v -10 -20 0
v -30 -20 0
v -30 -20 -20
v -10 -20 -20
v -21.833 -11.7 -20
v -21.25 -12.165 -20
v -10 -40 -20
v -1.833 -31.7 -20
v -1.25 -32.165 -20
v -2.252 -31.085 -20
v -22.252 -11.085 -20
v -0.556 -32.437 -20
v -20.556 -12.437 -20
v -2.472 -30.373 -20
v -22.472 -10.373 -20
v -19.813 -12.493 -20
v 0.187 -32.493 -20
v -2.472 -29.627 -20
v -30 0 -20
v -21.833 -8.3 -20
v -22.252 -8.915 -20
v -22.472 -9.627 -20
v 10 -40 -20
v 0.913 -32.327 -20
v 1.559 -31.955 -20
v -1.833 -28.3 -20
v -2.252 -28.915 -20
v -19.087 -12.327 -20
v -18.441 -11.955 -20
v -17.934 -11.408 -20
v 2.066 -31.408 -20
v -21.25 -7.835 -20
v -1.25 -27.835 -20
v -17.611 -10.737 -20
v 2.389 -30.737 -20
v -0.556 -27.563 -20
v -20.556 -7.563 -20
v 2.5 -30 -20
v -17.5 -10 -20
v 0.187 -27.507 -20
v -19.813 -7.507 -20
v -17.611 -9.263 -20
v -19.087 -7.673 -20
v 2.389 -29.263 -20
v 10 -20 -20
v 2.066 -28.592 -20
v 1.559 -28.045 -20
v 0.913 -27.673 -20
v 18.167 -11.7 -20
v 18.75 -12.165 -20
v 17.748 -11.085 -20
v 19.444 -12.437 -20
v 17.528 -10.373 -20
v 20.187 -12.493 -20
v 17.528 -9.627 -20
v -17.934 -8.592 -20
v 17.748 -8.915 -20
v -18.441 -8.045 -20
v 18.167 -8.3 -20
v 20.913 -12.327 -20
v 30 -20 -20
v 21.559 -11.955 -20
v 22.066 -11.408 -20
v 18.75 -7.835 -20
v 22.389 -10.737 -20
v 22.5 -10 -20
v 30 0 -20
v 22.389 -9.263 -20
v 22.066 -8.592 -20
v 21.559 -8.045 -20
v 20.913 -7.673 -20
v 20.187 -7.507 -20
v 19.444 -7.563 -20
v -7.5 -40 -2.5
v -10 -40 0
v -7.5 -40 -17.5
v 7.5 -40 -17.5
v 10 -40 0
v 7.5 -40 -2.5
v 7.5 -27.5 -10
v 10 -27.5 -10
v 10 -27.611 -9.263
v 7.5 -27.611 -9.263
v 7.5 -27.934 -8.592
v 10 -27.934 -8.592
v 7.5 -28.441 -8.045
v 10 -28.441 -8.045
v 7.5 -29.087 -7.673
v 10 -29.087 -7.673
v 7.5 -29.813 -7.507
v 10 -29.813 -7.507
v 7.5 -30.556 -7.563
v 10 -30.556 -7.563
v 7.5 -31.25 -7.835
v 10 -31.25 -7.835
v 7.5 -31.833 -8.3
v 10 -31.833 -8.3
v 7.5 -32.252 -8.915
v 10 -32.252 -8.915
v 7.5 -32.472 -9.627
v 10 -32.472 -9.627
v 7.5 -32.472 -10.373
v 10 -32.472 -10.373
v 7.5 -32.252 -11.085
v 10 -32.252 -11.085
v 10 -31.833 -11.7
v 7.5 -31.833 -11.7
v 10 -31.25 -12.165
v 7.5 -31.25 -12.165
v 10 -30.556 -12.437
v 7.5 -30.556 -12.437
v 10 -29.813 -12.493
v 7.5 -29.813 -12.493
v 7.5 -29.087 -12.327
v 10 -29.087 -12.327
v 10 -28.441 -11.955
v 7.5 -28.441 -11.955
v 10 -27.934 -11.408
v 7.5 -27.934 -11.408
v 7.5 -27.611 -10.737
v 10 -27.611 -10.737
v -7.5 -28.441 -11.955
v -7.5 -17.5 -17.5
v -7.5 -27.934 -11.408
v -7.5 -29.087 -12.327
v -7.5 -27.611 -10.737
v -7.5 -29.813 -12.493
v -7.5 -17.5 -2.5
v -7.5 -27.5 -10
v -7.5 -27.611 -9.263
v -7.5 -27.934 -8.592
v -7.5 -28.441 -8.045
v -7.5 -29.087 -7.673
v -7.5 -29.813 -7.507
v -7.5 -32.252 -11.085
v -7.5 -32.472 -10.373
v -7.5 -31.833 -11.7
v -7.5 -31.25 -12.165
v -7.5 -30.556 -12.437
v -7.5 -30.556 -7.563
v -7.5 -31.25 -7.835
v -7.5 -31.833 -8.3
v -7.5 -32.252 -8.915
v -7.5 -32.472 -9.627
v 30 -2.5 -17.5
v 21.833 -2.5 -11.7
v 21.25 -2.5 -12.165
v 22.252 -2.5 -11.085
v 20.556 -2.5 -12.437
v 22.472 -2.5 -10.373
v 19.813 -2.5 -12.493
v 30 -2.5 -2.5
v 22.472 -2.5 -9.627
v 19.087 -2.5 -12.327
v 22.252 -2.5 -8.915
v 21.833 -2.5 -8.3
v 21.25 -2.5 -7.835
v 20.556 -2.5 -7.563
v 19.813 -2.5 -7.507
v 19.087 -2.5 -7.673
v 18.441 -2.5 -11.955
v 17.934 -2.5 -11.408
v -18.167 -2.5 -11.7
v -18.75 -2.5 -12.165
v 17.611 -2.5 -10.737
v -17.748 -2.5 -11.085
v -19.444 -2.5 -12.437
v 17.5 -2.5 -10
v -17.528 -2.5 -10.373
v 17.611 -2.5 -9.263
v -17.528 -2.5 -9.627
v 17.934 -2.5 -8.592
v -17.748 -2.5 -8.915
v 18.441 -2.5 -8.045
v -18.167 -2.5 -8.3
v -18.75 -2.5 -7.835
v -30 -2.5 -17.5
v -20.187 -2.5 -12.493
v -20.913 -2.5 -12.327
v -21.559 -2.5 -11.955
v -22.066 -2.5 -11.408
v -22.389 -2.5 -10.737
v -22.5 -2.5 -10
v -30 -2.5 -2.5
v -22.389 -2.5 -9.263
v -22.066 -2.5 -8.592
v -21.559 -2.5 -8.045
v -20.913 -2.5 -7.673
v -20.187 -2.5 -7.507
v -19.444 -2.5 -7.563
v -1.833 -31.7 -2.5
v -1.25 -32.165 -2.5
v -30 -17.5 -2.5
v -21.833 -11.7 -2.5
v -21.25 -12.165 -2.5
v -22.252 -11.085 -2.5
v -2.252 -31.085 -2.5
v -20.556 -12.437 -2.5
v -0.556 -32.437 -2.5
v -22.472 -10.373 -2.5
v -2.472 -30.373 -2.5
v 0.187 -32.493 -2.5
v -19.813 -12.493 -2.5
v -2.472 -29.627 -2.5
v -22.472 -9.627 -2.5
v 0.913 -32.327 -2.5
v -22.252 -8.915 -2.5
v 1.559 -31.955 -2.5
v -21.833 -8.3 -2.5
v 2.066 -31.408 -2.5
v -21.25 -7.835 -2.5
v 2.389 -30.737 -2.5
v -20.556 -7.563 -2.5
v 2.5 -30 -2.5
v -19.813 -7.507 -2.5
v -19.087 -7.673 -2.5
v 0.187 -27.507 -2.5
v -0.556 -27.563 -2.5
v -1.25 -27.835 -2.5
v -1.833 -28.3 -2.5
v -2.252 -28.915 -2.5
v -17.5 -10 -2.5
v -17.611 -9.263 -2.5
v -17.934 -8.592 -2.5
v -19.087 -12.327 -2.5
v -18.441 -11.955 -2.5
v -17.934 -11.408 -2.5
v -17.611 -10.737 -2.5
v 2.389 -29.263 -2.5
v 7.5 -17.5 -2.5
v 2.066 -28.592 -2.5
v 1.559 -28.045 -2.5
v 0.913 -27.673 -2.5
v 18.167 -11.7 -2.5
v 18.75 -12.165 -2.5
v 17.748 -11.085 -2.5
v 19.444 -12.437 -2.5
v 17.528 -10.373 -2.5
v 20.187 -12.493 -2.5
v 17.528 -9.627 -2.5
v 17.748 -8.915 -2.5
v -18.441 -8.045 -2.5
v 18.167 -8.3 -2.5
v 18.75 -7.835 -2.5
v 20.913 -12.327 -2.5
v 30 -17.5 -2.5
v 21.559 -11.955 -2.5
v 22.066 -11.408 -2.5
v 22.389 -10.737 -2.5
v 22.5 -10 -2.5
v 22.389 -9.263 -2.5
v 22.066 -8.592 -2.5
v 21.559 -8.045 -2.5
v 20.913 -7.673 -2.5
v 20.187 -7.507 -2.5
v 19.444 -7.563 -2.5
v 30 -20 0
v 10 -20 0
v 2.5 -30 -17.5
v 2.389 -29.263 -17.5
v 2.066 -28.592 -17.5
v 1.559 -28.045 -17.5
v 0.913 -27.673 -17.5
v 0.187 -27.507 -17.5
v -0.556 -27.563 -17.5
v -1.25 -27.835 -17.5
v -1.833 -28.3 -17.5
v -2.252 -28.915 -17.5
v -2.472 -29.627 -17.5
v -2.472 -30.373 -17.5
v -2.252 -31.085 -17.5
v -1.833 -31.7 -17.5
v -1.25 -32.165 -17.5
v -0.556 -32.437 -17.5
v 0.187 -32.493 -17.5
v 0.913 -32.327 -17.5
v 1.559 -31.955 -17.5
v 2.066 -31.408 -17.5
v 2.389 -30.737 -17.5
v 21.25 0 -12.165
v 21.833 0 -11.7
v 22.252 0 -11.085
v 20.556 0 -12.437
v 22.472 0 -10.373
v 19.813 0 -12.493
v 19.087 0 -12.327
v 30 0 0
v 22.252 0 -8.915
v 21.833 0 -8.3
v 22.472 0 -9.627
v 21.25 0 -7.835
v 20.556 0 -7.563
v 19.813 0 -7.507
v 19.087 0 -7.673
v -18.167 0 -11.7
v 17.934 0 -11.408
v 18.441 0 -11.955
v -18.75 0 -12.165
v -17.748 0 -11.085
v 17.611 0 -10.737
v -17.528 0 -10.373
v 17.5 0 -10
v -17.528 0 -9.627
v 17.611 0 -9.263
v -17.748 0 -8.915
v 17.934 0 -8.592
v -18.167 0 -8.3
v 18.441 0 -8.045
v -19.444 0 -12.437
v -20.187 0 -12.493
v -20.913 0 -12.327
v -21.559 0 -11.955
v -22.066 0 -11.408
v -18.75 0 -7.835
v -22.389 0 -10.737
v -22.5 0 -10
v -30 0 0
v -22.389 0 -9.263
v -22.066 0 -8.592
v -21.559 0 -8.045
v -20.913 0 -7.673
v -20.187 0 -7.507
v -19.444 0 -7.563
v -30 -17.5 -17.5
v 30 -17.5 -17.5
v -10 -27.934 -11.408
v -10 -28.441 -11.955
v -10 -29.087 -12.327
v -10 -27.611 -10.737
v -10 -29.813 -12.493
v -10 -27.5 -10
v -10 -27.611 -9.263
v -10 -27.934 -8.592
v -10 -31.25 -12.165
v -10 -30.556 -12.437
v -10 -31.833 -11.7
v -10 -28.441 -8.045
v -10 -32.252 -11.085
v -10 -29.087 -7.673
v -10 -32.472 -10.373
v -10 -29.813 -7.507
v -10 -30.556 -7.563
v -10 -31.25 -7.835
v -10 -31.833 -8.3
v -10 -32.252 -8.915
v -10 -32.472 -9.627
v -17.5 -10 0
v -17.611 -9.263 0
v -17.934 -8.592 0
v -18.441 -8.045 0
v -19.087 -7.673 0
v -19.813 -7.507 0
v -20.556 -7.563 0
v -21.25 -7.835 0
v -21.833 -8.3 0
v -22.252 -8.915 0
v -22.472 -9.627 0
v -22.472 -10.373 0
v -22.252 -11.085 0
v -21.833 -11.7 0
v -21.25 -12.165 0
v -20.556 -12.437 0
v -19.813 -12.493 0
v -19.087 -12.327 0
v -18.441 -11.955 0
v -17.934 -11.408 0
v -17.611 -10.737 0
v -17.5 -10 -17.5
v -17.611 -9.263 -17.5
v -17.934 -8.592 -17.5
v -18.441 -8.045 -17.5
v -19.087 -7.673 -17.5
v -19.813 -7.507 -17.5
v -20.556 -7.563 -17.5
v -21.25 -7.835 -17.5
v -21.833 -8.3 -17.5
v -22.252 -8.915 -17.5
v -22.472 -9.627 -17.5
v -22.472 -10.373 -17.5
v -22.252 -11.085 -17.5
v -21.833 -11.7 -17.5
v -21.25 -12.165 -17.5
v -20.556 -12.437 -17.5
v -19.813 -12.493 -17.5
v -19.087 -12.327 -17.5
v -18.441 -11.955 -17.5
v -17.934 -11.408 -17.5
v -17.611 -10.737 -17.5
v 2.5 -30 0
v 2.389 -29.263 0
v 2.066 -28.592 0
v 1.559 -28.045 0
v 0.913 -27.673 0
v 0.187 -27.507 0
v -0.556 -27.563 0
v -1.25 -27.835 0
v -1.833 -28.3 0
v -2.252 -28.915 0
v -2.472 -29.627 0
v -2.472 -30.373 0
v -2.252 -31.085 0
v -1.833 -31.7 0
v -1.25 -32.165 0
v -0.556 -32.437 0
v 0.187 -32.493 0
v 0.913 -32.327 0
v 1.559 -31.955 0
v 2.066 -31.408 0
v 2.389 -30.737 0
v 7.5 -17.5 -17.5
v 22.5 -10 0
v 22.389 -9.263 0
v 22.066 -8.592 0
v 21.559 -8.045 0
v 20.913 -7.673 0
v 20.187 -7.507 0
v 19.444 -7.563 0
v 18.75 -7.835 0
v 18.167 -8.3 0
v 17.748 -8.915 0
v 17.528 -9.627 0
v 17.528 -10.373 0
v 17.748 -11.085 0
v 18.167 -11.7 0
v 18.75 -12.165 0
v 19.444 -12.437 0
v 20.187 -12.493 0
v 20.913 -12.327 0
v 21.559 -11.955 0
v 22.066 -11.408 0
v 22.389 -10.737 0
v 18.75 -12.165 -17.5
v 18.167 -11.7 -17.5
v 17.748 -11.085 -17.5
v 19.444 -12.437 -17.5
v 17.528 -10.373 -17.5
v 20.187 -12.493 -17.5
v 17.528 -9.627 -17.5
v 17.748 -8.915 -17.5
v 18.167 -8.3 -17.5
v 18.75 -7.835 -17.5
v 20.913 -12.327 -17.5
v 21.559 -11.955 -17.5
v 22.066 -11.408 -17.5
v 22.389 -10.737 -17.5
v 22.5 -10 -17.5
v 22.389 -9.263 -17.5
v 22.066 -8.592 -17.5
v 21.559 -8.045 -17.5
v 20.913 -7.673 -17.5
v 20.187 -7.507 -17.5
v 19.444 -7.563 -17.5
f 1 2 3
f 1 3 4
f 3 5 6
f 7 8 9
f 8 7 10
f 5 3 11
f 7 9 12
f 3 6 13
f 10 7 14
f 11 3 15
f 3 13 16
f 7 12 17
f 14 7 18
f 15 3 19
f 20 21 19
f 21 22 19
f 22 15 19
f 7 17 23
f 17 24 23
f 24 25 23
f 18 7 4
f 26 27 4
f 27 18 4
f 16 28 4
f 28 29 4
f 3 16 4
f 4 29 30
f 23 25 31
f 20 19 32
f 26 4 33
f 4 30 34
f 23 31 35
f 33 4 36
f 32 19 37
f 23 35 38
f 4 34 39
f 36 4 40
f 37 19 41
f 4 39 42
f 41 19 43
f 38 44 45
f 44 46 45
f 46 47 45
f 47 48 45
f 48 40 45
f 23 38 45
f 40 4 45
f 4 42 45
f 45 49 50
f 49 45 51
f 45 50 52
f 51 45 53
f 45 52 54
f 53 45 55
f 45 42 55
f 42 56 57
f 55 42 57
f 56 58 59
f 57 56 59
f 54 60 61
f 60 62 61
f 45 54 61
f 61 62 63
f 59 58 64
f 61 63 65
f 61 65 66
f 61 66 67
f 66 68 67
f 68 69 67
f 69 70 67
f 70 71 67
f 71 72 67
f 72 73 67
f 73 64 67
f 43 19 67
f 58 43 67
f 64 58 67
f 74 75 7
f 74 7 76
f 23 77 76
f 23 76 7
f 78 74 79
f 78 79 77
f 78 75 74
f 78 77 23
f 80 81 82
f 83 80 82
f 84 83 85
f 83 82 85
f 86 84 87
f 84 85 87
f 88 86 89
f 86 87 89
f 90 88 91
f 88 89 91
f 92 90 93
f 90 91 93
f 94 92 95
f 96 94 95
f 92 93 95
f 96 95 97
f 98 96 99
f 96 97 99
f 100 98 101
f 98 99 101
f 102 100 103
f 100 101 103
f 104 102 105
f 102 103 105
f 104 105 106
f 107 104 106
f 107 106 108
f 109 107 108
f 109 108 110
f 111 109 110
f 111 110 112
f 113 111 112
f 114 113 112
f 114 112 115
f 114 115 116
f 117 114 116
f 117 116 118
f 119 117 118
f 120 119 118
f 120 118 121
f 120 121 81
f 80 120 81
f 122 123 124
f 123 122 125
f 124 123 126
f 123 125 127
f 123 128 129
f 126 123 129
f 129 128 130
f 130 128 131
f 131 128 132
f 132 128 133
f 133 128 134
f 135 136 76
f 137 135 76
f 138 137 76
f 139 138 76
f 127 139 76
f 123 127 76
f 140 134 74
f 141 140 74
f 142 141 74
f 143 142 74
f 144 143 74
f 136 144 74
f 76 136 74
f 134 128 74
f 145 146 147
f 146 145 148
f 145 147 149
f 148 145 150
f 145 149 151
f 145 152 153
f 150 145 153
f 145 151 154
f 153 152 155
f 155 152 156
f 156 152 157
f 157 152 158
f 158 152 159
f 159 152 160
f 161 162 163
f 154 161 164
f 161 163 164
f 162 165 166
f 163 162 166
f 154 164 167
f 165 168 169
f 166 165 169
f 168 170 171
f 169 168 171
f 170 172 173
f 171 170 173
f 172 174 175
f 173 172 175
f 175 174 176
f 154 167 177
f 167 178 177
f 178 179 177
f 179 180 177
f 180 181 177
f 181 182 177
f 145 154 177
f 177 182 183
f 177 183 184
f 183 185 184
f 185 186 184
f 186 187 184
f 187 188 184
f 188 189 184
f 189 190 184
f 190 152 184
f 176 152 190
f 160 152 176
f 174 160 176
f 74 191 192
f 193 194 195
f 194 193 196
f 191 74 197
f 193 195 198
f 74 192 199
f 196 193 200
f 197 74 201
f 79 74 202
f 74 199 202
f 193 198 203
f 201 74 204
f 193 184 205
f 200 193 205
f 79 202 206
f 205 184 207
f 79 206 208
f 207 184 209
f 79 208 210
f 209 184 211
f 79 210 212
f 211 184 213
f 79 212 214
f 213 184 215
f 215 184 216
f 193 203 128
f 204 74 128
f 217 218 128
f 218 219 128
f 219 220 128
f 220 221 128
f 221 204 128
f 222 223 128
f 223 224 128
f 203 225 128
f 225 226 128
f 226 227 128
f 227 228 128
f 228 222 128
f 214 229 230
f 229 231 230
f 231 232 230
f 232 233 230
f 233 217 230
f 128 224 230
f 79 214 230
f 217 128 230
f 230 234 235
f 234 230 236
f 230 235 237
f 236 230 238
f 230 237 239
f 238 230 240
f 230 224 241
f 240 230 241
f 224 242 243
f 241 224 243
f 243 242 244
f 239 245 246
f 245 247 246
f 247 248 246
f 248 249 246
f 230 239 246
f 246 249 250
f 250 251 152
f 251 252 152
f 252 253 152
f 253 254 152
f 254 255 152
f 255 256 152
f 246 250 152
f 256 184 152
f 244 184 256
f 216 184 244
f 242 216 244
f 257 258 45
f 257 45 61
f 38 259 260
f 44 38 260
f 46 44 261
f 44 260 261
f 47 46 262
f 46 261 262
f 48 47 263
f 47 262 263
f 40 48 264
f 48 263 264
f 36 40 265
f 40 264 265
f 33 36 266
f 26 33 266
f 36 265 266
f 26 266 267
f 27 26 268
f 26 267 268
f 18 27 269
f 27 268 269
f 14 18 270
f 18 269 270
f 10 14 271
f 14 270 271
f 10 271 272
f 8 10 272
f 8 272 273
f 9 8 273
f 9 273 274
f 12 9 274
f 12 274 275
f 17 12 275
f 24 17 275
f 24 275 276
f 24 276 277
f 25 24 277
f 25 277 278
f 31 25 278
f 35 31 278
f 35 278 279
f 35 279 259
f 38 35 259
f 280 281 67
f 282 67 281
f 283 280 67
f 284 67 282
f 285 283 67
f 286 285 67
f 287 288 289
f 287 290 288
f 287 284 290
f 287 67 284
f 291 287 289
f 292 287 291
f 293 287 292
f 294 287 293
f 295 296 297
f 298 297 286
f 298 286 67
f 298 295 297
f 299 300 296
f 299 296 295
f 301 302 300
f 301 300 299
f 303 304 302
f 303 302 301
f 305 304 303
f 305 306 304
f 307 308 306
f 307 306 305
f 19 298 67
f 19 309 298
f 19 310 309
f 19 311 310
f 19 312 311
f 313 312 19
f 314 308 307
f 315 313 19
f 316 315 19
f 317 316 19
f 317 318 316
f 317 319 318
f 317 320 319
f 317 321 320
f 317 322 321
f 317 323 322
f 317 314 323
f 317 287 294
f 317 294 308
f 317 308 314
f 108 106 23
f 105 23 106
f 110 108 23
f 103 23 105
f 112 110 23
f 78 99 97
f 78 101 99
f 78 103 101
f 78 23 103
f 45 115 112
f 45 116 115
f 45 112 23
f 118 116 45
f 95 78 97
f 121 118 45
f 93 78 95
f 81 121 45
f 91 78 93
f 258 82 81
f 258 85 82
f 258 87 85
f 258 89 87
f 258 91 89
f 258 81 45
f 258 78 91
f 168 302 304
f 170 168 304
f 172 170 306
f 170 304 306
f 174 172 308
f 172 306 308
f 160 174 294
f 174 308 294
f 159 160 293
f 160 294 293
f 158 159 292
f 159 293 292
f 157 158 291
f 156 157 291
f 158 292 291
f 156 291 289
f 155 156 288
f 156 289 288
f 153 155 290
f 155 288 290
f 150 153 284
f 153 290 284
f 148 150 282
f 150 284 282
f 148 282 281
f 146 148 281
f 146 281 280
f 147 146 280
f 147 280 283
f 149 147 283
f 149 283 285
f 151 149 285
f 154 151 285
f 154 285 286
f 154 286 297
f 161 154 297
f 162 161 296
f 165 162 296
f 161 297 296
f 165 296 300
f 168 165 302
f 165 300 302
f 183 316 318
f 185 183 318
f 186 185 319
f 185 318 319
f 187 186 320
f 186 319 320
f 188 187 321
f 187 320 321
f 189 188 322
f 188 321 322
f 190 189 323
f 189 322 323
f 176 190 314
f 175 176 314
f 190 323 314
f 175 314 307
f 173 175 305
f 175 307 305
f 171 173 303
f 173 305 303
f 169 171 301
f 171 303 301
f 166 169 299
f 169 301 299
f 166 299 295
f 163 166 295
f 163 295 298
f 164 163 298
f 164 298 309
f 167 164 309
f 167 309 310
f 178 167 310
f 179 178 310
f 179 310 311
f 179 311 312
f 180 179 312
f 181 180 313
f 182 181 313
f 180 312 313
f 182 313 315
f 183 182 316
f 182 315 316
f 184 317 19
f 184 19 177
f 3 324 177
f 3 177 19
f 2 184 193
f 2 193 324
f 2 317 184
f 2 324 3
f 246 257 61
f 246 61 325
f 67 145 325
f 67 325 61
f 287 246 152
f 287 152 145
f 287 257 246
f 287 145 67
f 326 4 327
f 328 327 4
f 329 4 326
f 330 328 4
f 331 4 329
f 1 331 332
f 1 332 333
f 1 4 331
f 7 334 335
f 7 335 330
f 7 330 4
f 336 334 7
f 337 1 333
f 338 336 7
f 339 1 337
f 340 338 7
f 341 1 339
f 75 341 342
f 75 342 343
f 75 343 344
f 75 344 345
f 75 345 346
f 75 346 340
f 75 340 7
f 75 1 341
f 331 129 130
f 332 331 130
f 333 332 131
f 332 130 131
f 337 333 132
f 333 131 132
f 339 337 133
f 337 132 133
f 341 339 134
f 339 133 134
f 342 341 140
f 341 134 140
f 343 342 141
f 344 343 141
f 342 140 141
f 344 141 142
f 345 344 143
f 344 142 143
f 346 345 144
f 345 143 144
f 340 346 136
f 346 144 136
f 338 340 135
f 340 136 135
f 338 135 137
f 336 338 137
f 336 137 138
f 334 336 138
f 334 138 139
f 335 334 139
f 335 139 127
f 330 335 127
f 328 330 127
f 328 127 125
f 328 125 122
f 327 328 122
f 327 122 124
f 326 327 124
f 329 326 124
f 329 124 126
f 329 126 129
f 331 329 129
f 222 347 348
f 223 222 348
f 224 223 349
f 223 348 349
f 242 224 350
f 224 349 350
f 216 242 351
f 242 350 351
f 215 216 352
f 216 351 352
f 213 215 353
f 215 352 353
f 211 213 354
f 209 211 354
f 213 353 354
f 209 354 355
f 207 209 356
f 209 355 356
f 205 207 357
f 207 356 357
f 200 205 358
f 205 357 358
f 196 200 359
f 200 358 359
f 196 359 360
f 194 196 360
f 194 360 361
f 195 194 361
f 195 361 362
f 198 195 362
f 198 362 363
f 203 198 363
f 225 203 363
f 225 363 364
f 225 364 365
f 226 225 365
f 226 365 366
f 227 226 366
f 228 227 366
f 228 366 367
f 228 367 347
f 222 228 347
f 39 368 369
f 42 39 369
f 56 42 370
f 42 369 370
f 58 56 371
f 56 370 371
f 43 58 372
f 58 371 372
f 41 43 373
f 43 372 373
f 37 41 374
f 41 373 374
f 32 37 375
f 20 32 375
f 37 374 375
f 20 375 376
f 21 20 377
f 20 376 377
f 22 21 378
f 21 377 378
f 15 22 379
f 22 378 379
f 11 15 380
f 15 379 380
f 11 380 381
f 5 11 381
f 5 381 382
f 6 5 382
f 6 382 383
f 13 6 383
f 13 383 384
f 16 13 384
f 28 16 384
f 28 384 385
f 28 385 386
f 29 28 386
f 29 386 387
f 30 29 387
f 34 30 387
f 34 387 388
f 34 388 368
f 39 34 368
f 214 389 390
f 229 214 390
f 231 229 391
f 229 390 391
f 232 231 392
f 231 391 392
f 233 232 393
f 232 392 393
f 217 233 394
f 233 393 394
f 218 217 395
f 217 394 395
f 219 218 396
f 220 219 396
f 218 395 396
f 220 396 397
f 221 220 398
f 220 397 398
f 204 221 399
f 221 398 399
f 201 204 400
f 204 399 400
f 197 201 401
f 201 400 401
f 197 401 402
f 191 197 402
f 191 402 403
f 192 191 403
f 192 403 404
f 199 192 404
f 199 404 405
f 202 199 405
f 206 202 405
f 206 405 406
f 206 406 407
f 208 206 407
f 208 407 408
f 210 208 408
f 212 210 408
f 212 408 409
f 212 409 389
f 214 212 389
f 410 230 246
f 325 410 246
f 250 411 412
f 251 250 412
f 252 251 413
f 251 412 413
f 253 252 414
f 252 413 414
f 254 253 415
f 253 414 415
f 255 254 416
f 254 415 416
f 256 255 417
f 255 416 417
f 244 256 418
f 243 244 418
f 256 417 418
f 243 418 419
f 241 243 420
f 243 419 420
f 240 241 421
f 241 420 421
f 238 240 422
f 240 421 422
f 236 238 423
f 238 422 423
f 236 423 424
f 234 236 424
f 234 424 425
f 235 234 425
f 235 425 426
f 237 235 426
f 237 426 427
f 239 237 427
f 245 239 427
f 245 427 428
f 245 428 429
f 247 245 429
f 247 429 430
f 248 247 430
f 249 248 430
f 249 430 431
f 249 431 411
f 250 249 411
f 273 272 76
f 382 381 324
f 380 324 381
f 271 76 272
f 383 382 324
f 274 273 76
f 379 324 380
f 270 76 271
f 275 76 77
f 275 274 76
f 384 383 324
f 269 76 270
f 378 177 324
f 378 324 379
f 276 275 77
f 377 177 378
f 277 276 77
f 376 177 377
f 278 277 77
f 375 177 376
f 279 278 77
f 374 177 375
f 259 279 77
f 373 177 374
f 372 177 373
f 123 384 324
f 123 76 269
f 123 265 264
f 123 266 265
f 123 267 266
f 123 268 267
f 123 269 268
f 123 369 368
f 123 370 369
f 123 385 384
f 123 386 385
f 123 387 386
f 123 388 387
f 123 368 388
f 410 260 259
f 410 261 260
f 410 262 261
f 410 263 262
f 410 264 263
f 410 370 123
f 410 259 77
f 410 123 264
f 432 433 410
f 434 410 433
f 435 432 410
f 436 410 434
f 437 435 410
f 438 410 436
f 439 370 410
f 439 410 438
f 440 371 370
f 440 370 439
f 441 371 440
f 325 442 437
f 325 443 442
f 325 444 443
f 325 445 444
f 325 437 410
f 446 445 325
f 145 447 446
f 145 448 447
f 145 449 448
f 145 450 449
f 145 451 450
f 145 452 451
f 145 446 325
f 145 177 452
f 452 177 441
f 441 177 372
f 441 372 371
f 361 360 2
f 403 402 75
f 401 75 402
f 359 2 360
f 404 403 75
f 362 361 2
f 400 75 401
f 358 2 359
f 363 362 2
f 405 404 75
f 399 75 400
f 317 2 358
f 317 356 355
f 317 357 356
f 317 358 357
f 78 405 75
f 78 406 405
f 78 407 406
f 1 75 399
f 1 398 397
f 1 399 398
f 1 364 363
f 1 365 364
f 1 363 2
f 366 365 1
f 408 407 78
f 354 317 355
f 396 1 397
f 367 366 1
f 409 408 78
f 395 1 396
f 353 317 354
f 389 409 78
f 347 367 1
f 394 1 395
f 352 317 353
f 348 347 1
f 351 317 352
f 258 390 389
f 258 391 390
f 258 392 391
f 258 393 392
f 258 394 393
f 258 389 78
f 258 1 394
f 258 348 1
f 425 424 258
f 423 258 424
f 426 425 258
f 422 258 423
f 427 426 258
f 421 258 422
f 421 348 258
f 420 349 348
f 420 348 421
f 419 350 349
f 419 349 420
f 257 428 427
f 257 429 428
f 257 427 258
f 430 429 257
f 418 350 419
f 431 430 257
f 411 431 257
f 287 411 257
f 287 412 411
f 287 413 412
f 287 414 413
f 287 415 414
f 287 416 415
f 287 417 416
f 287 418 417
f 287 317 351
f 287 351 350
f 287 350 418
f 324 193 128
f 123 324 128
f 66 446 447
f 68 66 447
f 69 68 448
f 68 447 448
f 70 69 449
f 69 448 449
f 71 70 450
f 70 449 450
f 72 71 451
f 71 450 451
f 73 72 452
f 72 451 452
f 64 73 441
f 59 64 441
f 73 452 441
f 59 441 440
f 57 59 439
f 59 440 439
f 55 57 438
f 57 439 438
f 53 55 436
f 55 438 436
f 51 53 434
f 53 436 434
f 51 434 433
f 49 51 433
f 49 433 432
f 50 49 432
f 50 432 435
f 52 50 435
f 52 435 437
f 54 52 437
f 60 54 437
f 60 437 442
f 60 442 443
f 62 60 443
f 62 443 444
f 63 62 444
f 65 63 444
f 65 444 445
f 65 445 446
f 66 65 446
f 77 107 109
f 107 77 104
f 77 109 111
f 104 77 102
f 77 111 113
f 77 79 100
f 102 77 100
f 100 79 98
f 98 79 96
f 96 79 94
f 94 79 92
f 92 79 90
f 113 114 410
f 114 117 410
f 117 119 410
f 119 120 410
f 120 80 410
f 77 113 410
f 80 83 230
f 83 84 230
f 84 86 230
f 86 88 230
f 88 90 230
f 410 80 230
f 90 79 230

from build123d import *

# Parameters (mm, degrees)
F1_DEPTH = 20
F2_T     = -2.5
F3_R     = 2.5
F4_DEPTH = 20.001
F5_R     = 2.5
F6_DEPTH = 2.5
F7_R     = 2.5
F8_DEPTH = 40.001


with BuildPart() as f1:
    # F0 (on Top) → F1 (new body)
    with BuildSketch(Plane.XY):
        Polygon((30, 0), (-30, 0), (-30, -20), (-10, -20), (-10, -40), (10, -40), (10, -20), (30, -20), align=None)
    extrude(amount=-F1_DEPTH)

    # F2
    f2_openings = [f1.faces().sort_by_distance(p)[0] for p in [
        (30, -10, -10),
        (0, -40, -10),
        (-30, -10, -10),
    ]]
    offset(amount=F2_T, openings=f2_openings, kind=Kind.INTERSECTION)

    # F3 (on face) → F4 (cut, through all)
    with BuildSketch(Plane.XY):
        with Locations((-20, -10)):
            Circle(F3_R)
        with Locations((20, -10)):
            Circle(F3_R)
        with Locations((0, -30)):
            Circle(F3_R)
    extrude(amount=-F4_DEPTH, mode=Mode.SUBTRACT)

    # F5 (on face) → F6 (cut, through all)
    with BuildSketch(Plane(origin=(0, 0, 0), x_dir=(-1, 0, 0), z_dir=(0, 1, 0))):
        with Locations((-20, -10)):
            Circle(F5_R)
        with Locations((20, -10)):
            Circle(F5_R)
    extrude(amount=-F6_DEPTH, mode=Mode.SUBTRACT)

    # F7 (on face) → F8 (cut, through all)
    with BuildSketch(Plane.YZ.offset(10)):
        with Locations((-30, -10)):
            Circle(F7_R)
    extrude(amount=-F8_DEPTH, mode=Mode.SUBTRACT)


solid = f1.part
